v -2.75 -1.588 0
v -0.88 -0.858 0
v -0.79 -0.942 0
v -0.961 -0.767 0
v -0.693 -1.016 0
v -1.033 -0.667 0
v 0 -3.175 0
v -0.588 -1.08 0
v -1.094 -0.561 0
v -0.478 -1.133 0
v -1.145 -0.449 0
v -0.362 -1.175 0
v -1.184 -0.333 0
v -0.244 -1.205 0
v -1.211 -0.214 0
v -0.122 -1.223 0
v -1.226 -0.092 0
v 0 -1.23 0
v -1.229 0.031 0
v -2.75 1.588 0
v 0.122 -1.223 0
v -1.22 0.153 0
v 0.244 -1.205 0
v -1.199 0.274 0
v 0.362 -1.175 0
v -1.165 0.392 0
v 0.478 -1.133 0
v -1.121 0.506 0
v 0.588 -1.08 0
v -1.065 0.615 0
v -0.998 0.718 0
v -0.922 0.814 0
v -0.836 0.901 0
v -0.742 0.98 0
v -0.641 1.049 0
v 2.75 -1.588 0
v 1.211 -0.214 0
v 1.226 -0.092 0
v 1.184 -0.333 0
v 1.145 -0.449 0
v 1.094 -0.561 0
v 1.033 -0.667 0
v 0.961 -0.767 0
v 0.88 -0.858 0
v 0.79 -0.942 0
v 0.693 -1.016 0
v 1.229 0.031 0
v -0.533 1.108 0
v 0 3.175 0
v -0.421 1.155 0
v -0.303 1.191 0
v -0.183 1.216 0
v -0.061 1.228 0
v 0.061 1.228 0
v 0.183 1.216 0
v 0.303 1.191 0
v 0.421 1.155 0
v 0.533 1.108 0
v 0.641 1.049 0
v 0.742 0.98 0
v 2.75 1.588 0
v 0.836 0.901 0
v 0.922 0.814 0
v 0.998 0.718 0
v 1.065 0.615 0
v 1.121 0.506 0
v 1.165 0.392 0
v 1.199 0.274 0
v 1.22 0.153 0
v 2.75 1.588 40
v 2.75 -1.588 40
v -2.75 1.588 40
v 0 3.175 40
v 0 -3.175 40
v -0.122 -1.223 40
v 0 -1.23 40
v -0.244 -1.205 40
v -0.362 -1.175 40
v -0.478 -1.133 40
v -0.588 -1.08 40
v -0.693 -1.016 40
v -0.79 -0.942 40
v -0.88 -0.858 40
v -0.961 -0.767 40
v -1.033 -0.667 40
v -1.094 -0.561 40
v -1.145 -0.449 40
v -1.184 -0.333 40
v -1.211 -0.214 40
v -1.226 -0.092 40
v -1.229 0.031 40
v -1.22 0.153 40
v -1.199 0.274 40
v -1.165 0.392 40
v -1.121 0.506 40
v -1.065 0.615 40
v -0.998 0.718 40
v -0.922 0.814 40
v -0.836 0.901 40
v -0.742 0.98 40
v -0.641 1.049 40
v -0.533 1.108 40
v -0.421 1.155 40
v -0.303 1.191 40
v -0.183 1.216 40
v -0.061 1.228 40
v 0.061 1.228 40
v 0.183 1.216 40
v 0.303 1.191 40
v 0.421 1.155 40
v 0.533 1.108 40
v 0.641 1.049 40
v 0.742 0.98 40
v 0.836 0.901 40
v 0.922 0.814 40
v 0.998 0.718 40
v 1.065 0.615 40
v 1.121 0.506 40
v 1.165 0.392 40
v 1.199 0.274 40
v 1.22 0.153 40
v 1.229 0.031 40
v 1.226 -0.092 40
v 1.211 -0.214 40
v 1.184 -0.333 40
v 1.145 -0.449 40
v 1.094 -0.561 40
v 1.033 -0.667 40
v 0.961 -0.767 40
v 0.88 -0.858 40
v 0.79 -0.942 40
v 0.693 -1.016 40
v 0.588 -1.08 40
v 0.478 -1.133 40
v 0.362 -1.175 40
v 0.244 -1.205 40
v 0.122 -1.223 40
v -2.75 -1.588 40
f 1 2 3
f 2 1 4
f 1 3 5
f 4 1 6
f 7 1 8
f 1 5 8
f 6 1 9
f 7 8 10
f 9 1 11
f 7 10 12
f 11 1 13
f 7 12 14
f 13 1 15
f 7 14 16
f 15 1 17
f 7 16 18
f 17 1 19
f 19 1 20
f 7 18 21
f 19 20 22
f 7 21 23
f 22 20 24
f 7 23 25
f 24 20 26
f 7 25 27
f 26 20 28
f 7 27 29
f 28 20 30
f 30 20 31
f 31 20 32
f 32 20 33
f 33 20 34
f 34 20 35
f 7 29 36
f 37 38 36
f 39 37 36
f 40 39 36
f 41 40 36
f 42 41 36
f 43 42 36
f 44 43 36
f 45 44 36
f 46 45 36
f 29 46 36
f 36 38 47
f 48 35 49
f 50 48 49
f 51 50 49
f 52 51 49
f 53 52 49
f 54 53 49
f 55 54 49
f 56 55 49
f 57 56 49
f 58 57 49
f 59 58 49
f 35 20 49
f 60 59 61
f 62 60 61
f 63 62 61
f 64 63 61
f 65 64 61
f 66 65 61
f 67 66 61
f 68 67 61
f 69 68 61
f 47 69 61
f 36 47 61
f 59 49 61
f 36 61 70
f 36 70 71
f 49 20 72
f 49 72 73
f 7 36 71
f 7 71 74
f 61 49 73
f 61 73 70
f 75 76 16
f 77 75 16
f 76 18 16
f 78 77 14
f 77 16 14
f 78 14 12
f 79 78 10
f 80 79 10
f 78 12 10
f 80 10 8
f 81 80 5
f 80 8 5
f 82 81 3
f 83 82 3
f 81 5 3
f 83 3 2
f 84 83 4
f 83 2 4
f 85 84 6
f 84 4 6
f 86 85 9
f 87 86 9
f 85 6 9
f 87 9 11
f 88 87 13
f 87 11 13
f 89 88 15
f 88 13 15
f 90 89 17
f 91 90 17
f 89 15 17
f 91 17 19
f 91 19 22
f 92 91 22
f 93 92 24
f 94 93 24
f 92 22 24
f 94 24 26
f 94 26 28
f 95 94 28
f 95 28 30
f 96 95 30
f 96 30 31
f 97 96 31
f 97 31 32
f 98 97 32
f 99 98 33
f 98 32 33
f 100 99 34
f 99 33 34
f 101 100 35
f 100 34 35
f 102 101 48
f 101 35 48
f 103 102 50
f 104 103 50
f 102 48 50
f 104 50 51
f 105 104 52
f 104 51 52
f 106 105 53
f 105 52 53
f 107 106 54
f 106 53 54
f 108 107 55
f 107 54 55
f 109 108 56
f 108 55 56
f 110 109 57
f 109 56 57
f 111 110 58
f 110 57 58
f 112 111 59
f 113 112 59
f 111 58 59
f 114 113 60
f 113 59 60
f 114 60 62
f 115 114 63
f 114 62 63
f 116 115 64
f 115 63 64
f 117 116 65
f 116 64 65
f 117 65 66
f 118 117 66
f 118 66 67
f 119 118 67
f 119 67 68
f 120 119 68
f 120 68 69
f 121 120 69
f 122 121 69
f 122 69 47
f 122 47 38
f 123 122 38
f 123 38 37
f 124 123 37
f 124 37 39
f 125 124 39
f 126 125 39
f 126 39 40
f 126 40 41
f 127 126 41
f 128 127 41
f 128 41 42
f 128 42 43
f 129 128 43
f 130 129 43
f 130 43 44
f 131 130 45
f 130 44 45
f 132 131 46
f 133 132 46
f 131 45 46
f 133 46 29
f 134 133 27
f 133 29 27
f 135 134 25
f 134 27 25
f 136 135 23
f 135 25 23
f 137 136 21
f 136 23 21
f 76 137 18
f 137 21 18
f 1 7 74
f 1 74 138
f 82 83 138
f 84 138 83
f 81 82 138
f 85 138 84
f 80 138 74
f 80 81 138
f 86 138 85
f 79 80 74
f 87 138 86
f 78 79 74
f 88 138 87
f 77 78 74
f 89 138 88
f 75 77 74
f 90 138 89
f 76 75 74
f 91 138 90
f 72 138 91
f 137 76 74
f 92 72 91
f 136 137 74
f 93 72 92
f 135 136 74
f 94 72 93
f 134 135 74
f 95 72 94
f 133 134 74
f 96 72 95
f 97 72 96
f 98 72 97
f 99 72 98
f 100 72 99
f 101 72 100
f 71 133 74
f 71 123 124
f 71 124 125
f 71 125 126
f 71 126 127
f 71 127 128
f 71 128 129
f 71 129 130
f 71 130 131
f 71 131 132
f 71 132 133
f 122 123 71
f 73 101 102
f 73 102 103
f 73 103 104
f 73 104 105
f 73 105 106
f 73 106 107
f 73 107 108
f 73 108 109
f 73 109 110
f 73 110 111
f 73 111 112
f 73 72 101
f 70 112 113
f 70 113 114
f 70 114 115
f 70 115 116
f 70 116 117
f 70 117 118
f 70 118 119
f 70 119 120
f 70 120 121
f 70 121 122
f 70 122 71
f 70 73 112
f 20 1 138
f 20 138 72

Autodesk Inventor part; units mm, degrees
ref_plane "YZ Plane" through (0, 0, 0) normal (1, 0, 0) x (0, 1, 0)
ref_plane "XZ Plane" through (0, 0, 0) normal (0, 1, 0) x (-1, 0, 0)
ref_plane "XY Plane" through (0, 0, 0) normal (0, 0, 1) x (1, 0, 0)
sketch "スケッチ1" plane through (0, 0, 0) normal (0, 0, 1) x (1, 0, 0)
  line L0 (0, 3.1754) -> (2.75, 1.5877)
  line L1 (2.75, 1.5877) -> (2.75, -1.5877)
  line L2 (2.75, -1.5877) -> (0, -3.1754)
  line L3 (0, -3.1754) -> (-2.75, -1.5877)
  line L4 (-2.75, -1.5877) -> (-2.75, 1.5877)
  line L5 (-2.75, 1.5877) -> (0, 3.1754)
  point P0 (0, 0)
  point P1 (0, 0)
  dimension "d0" = 5.5
extrude "押し出し1" add sketch "スケッチ1" along normal blind 40
sketch "スケッチ2" plane through (0, 0, 40) normal (0, 0, 1) x (1, 0, 0)
  point P0 (0, 0)
hole "穴1" at (0, 0, 40) direction (0, 0, -1) diameter 2.459 end through all thread size "M3x0.5" class "6H" standard "ISO Metric profile"
properties part number "ジュラコンスペーサー（六角）_AS-340B" material "アセタール樹脂、黒"
